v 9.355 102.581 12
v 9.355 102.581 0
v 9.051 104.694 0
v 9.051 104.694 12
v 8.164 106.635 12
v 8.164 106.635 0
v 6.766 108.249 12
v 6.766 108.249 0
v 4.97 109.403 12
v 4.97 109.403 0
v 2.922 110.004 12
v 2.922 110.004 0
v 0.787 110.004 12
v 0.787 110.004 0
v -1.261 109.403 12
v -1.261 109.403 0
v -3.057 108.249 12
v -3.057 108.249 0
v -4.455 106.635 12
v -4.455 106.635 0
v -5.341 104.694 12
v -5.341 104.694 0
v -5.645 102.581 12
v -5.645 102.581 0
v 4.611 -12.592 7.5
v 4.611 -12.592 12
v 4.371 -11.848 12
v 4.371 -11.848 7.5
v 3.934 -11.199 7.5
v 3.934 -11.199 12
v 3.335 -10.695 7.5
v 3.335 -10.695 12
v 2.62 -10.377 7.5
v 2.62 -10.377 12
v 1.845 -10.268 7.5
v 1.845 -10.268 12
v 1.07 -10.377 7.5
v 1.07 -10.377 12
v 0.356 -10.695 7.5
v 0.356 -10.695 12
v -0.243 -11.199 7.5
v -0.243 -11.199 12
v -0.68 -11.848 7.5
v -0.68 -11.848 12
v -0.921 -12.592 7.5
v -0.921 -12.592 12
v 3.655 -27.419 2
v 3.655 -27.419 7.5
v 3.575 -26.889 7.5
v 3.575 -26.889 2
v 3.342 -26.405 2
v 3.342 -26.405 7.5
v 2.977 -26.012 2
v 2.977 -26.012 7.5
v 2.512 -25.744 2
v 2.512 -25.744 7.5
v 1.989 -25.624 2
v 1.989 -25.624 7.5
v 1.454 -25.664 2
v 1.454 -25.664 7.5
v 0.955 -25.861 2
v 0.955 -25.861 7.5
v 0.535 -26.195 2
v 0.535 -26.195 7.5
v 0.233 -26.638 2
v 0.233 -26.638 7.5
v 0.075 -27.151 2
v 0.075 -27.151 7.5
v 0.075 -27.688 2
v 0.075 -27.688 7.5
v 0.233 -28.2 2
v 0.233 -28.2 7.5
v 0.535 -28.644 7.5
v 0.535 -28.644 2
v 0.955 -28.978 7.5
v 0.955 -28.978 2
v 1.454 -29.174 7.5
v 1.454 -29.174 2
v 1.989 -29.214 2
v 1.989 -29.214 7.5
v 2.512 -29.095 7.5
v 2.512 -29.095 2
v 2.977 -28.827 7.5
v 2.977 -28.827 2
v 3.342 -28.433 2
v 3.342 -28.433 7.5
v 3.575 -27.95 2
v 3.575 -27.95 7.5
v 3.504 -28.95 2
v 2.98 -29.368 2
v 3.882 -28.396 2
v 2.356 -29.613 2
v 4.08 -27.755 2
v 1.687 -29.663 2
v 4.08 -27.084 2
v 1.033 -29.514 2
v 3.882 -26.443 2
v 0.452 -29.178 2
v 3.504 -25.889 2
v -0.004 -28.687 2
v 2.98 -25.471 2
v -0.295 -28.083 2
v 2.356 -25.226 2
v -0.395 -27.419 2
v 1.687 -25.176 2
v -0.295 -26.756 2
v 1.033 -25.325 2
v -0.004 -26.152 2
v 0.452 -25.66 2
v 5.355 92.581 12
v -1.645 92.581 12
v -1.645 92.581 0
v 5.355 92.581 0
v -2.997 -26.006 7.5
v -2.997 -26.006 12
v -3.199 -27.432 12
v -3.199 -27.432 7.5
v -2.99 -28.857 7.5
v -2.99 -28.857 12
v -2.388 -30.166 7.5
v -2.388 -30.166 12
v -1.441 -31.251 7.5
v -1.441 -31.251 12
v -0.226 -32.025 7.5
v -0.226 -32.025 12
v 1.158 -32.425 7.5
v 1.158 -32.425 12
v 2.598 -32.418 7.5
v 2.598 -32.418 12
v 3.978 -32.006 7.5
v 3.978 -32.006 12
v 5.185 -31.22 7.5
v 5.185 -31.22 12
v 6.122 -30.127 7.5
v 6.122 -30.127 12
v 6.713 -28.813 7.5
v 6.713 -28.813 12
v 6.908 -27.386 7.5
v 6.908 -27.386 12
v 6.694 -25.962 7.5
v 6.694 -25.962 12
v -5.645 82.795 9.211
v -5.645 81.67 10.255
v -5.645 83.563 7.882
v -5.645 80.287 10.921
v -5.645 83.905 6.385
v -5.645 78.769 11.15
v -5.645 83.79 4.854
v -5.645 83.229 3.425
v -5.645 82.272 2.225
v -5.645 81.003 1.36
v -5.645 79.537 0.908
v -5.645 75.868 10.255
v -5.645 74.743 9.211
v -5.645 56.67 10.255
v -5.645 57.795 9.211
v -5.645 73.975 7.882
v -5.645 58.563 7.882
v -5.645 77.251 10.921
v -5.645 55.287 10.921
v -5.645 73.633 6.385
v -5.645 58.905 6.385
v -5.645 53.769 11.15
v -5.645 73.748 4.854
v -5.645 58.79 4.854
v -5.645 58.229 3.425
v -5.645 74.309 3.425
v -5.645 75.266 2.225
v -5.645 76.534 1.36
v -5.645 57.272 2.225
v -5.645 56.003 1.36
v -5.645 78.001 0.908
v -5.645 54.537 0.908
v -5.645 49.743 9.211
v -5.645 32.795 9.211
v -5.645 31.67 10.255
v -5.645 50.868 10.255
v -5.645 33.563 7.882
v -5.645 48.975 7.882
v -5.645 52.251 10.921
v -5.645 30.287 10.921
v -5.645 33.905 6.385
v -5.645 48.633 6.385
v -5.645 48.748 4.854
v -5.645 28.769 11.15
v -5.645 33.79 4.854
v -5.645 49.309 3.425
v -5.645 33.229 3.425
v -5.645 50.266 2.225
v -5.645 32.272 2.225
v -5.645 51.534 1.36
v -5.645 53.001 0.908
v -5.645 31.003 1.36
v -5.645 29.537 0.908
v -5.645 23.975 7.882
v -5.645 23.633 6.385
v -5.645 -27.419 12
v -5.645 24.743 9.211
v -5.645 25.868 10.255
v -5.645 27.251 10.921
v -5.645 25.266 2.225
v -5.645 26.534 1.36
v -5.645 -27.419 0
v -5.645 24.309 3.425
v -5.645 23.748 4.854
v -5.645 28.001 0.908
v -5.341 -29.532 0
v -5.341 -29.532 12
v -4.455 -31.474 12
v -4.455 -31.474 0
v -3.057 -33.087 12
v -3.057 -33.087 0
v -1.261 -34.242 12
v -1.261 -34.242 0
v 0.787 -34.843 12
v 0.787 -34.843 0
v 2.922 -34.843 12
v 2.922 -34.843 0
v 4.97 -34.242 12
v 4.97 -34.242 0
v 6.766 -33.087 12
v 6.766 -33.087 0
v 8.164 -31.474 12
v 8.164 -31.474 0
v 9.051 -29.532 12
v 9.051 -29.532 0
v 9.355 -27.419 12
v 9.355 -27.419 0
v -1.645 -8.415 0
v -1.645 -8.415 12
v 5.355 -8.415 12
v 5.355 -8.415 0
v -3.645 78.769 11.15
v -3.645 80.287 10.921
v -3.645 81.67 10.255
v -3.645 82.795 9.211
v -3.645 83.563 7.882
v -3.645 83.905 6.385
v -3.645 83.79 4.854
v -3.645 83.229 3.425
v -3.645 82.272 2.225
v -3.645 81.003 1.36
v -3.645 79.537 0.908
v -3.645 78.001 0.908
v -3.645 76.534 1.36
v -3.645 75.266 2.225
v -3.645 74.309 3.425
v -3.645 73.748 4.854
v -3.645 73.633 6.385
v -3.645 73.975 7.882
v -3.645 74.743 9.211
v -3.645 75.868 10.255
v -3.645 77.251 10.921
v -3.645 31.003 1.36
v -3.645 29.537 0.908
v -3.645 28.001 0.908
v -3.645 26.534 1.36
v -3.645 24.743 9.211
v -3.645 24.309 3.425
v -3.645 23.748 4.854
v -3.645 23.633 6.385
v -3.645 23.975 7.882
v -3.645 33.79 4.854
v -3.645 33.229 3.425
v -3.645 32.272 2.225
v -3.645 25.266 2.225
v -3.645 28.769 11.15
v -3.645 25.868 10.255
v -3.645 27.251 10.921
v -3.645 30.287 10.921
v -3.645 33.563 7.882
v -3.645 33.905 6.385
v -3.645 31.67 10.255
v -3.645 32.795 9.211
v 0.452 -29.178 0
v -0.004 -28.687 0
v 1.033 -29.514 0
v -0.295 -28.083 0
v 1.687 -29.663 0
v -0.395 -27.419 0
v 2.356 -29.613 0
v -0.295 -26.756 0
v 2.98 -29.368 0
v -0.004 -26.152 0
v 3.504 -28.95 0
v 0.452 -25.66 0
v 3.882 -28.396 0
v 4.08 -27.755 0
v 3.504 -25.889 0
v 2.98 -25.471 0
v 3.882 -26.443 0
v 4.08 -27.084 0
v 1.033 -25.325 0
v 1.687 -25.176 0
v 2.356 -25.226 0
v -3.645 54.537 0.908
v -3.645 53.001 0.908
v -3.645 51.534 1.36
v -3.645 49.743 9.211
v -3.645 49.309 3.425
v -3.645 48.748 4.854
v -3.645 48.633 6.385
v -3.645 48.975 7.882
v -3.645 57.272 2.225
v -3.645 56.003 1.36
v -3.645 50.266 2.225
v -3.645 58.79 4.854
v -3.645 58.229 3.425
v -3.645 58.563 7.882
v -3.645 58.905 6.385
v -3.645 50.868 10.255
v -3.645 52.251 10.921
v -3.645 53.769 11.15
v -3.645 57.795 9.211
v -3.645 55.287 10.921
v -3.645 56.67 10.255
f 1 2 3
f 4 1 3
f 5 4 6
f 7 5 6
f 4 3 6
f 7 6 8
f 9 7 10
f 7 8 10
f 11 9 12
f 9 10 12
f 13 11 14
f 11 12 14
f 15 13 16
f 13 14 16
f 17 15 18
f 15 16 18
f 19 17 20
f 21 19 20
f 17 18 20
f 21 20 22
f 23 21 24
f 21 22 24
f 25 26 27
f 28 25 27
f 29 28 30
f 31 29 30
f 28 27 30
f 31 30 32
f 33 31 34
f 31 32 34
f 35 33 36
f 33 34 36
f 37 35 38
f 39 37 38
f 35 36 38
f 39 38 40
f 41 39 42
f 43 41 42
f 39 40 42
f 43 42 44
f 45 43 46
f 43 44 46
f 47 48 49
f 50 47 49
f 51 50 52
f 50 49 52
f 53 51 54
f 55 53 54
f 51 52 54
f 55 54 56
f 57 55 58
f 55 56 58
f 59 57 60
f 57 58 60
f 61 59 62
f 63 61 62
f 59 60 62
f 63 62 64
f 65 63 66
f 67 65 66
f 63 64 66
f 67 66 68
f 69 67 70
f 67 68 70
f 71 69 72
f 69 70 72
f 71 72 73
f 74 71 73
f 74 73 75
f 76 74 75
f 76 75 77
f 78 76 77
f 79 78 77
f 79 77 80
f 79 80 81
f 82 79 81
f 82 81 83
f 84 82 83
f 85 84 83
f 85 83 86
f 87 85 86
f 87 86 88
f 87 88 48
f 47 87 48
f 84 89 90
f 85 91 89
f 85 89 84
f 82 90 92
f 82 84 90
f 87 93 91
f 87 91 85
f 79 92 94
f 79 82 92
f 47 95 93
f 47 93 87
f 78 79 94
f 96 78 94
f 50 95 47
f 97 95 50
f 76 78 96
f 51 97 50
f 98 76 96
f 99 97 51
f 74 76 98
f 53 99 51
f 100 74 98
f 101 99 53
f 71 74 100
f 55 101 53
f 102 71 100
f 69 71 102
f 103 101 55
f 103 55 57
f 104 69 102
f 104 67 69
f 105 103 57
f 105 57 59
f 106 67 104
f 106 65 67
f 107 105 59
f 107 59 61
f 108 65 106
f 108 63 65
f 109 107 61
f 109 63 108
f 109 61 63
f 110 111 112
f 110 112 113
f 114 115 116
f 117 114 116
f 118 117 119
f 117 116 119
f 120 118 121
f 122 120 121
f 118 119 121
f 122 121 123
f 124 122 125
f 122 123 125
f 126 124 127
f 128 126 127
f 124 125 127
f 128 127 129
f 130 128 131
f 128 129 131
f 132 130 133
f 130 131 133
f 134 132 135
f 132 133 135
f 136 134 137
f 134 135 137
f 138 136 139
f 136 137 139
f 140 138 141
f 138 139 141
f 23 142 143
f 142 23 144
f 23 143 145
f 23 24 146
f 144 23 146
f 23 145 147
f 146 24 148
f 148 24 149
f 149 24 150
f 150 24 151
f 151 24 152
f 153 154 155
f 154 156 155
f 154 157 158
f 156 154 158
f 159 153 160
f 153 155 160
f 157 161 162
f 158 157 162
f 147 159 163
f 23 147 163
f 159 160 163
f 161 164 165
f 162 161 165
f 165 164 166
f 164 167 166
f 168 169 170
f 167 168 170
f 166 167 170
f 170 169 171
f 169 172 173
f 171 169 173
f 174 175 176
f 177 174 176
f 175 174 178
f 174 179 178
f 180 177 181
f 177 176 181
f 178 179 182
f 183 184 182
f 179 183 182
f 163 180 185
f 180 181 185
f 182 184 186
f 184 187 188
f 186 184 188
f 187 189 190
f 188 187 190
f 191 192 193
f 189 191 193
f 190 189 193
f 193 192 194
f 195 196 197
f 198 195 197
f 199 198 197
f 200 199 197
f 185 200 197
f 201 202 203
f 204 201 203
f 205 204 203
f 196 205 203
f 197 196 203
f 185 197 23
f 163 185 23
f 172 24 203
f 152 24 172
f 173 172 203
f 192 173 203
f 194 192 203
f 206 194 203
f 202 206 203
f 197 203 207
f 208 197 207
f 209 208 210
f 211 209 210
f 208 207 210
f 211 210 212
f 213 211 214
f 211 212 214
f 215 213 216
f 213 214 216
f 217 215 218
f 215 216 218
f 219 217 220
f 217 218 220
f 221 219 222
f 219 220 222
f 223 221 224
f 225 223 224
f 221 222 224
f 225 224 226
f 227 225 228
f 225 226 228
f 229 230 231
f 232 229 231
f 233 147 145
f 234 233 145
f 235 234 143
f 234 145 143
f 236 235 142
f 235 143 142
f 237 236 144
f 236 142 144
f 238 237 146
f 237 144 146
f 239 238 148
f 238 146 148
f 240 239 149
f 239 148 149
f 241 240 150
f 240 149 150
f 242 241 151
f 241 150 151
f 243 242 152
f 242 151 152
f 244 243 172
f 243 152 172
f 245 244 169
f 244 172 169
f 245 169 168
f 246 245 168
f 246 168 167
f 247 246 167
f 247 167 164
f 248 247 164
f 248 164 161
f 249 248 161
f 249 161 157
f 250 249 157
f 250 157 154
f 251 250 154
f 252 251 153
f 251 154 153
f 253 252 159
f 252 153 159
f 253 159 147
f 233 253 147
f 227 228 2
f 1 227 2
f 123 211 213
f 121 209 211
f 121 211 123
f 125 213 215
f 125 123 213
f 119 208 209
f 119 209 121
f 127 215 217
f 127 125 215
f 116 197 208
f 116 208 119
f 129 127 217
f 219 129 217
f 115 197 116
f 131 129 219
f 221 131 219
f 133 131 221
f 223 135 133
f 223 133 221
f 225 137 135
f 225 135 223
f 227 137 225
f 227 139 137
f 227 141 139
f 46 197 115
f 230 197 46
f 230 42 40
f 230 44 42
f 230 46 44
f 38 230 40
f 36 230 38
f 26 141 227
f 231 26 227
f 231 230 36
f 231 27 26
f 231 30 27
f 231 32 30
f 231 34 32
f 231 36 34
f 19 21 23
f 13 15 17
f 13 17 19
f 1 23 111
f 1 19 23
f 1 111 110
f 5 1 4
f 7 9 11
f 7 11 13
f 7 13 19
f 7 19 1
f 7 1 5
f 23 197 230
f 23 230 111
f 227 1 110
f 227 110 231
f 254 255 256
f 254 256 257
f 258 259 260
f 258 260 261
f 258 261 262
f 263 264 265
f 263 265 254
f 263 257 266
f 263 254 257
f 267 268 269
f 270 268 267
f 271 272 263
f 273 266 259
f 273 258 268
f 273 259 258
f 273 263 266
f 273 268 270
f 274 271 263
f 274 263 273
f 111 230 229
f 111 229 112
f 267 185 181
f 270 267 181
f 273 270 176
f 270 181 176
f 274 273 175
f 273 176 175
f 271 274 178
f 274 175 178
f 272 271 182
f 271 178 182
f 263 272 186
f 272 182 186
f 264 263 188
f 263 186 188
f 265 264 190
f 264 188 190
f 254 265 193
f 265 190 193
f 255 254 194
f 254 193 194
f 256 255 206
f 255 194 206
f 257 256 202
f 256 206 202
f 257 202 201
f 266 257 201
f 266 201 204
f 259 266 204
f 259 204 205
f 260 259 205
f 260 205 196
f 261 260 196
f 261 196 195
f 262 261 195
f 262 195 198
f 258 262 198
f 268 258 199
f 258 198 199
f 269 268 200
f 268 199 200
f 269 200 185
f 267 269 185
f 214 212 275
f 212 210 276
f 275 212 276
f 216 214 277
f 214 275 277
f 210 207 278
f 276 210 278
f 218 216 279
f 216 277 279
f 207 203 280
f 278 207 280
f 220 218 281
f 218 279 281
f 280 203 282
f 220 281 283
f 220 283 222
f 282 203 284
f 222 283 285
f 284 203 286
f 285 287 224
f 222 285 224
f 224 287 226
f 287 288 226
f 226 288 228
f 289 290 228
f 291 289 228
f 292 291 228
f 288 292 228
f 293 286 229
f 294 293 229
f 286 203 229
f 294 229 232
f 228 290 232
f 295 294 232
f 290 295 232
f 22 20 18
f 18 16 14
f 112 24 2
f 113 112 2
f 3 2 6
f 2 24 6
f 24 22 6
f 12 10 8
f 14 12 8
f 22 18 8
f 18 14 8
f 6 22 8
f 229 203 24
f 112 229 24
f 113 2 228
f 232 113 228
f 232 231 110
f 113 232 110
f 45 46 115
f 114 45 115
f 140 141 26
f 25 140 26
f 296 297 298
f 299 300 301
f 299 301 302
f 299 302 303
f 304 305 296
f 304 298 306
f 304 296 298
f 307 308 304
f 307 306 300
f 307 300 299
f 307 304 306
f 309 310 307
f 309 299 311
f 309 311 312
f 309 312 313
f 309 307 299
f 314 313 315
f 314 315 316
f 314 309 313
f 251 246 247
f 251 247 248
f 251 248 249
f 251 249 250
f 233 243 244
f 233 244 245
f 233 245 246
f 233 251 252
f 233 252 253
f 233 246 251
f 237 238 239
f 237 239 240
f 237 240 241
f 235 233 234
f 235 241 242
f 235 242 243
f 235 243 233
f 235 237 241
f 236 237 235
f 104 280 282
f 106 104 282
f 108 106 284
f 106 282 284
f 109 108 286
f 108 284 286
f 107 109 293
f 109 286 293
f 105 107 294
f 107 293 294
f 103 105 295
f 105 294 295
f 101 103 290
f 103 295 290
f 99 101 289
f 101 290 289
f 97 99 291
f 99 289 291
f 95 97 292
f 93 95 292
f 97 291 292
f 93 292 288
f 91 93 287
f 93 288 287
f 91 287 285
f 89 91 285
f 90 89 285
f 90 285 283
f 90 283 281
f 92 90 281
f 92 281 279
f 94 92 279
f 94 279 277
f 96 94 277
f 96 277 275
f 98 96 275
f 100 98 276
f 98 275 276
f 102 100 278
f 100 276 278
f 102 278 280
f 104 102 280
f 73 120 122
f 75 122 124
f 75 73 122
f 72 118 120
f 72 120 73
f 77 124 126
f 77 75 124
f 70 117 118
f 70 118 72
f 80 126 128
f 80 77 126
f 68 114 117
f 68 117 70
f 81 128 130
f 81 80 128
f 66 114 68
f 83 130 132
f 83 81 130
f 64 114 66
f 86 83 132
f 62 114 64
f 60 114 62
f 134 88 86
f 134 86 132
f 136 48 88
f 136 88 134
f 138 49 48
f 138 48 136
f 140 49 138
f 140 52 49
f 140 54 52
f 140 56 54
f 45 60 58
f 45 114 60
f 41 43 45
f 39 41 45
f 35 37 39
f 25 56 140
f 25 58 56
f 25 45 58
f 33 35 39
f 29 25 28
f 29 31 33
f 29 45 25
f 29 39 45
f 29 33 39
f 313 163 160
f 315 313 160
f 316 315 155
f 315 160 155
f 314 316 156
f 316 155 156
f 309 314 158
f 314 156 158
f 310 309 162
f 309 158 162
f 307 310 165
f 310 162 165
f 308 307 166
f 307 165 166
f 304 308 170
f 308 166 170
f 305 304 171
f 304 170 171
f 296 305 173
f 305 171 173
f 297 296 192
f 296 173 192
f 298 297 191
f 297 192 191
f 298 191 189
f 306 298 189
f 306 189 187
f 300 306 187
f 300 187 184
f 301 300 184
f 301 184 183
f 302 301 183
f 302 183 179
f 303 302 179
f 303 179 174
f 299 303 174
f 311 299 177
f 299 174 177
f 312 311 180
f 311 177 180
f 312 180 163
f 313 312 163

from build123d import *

# Parameters (mm, degrees)
BOSS_EXTRUDE1_DEPTH = 12
SKETCH5_W           = 7
SKETCH5_H           = 112.5
CUT_EXTRUDE3_DEPTH  = 12
SKETCH6_R           = 5.15
CUT_EXTRUDE4_DEPTH  = 2
SKETCH7_W           = 9.454853554
SKETCH7_H           = 12.627623204
BOSS_EXTRUDE2_DEPTH = 12
SKETCH8_R           = 1.8
CUT_EXTRUDE5_DEPTH  = 4.5
SKETCH9_R           = 1.8
CUT_EXTRUDE6_DEPTH  = 13.5
SKETCH10_R          = 2.25
CUT_EXTRUDE7_DEPTH  = 2


with BuildPart() as part:
    # Sketch1 → Boss-Extrude1 (new body)
    with BuildSketch(Plane.XY):
        with BuildLine():
            Line((-5.64516129, 102.580645161), (-5.64516129, -27.419354839))
            ThreePointArc((-5.64516129, -27.419354839), (1.85483871, -34.919354839), (9.35483871, -27.419354839))
            Line((9.35483871, -27.419354839), (9.35483871, 102.580645161))
            ThreePointArc((9.35483871, 102.580645161), (1.85483871, 110.080645161), (-5.64516129, 102.580645161))
        make_face()
    extrude(amount=BOSS_EXTRUDE1_DEPTH)

    # Sketch5 → Cut-Extrude3 (cut)
    with BuildSketch(Plane.XY.offset(12)):
        with Locations((1.85483871, 36.330645161)):
            Rectangle(SKETCH5_W, SKETCH5_H)
    extrude(amount=-CUT_EXTRUDE3_DEPTH, mode=Mode.SUBTRACT)

    # Sketch6 → Cut-Extrude4 (cut)
    with BuildSketch(Plane.ZY.offset(5.64516129)):
        with Locations((6, 78.768969581)):
            Circle(SKETCH6_R)
        with Locations((6, 53.768969581)):
            Circle(SKETCH6_R)
        with Locations((6, 28.768969581)):
            Circle(SKETCH6_R)
    extrude(amount=-CUT_EXTRUDE4_DEPTH, mode=Mode.SUBTRACT)

    # Sketch7 → Boss-Extrude2 (add)
    with BuildSketch(Plane.XY.offset(12)):
        with Locations((2.35113594, -14.728820961)):
            Rectangle(SKETCH7_W, SKETCH7_H)
    extrude(amount=-BOSS_EXTRUDE2_DEPTH)

    # Sketch8 → Cut-Extrude5 (cut)
    with BuildSketch(Plane.XY.offset(12)):
        with BuildLine():
            Line((6.693784724, -25.961716652), (4.61141034, -12.592472516))
            ThreePointArc((4.61141034, -12.592472516), (1.845305929, -10.267914611), (-0.920798482, -12.592472516))
            Line((-0.920798482, -12.592472516), (-2.997287431, -26.006209578))
            ThreePointArc((-2.997287431, -26.006209578), (1.878040737, -32.473023732), (6.693784724, -25.961716652))
        make_face()
        with Locations((1.85483871, -27.419354839)):
            Circle(SKETCH8_R, mode=Mode.SUBTRACT)
    extrude(amount=-CUT_EXTRUDE5_DEPTH, mode=Mode.SUBTRACT)

    # Sketch9 → Cut-Extrude6 (cut)
    with BuildSketch(Plane.XY.offset(12)):
        with Locations((1.85483871, -27.419354839)):
            Circle(SKETCH9_R)
    extrude(amount=-CUT_EXTRUDE6_DEPTH, mode=Mode.SUBTRACT)

    # Sketch10 → Cut-Extrude7 (cut)
    with BuildSketch(Plane(origin=(0, 0, 0), x_dir=(-1, 0, 0), z_dir=(0, 0, -1))):
        with Locations((-1.85483871, -27.419354839)):
            Circle(SKETCH10_R)
    extrude(amount=-CUT_EXTRUDE7_DEPTH, mode=Mode.SUBTRACT)


solid = part.part
